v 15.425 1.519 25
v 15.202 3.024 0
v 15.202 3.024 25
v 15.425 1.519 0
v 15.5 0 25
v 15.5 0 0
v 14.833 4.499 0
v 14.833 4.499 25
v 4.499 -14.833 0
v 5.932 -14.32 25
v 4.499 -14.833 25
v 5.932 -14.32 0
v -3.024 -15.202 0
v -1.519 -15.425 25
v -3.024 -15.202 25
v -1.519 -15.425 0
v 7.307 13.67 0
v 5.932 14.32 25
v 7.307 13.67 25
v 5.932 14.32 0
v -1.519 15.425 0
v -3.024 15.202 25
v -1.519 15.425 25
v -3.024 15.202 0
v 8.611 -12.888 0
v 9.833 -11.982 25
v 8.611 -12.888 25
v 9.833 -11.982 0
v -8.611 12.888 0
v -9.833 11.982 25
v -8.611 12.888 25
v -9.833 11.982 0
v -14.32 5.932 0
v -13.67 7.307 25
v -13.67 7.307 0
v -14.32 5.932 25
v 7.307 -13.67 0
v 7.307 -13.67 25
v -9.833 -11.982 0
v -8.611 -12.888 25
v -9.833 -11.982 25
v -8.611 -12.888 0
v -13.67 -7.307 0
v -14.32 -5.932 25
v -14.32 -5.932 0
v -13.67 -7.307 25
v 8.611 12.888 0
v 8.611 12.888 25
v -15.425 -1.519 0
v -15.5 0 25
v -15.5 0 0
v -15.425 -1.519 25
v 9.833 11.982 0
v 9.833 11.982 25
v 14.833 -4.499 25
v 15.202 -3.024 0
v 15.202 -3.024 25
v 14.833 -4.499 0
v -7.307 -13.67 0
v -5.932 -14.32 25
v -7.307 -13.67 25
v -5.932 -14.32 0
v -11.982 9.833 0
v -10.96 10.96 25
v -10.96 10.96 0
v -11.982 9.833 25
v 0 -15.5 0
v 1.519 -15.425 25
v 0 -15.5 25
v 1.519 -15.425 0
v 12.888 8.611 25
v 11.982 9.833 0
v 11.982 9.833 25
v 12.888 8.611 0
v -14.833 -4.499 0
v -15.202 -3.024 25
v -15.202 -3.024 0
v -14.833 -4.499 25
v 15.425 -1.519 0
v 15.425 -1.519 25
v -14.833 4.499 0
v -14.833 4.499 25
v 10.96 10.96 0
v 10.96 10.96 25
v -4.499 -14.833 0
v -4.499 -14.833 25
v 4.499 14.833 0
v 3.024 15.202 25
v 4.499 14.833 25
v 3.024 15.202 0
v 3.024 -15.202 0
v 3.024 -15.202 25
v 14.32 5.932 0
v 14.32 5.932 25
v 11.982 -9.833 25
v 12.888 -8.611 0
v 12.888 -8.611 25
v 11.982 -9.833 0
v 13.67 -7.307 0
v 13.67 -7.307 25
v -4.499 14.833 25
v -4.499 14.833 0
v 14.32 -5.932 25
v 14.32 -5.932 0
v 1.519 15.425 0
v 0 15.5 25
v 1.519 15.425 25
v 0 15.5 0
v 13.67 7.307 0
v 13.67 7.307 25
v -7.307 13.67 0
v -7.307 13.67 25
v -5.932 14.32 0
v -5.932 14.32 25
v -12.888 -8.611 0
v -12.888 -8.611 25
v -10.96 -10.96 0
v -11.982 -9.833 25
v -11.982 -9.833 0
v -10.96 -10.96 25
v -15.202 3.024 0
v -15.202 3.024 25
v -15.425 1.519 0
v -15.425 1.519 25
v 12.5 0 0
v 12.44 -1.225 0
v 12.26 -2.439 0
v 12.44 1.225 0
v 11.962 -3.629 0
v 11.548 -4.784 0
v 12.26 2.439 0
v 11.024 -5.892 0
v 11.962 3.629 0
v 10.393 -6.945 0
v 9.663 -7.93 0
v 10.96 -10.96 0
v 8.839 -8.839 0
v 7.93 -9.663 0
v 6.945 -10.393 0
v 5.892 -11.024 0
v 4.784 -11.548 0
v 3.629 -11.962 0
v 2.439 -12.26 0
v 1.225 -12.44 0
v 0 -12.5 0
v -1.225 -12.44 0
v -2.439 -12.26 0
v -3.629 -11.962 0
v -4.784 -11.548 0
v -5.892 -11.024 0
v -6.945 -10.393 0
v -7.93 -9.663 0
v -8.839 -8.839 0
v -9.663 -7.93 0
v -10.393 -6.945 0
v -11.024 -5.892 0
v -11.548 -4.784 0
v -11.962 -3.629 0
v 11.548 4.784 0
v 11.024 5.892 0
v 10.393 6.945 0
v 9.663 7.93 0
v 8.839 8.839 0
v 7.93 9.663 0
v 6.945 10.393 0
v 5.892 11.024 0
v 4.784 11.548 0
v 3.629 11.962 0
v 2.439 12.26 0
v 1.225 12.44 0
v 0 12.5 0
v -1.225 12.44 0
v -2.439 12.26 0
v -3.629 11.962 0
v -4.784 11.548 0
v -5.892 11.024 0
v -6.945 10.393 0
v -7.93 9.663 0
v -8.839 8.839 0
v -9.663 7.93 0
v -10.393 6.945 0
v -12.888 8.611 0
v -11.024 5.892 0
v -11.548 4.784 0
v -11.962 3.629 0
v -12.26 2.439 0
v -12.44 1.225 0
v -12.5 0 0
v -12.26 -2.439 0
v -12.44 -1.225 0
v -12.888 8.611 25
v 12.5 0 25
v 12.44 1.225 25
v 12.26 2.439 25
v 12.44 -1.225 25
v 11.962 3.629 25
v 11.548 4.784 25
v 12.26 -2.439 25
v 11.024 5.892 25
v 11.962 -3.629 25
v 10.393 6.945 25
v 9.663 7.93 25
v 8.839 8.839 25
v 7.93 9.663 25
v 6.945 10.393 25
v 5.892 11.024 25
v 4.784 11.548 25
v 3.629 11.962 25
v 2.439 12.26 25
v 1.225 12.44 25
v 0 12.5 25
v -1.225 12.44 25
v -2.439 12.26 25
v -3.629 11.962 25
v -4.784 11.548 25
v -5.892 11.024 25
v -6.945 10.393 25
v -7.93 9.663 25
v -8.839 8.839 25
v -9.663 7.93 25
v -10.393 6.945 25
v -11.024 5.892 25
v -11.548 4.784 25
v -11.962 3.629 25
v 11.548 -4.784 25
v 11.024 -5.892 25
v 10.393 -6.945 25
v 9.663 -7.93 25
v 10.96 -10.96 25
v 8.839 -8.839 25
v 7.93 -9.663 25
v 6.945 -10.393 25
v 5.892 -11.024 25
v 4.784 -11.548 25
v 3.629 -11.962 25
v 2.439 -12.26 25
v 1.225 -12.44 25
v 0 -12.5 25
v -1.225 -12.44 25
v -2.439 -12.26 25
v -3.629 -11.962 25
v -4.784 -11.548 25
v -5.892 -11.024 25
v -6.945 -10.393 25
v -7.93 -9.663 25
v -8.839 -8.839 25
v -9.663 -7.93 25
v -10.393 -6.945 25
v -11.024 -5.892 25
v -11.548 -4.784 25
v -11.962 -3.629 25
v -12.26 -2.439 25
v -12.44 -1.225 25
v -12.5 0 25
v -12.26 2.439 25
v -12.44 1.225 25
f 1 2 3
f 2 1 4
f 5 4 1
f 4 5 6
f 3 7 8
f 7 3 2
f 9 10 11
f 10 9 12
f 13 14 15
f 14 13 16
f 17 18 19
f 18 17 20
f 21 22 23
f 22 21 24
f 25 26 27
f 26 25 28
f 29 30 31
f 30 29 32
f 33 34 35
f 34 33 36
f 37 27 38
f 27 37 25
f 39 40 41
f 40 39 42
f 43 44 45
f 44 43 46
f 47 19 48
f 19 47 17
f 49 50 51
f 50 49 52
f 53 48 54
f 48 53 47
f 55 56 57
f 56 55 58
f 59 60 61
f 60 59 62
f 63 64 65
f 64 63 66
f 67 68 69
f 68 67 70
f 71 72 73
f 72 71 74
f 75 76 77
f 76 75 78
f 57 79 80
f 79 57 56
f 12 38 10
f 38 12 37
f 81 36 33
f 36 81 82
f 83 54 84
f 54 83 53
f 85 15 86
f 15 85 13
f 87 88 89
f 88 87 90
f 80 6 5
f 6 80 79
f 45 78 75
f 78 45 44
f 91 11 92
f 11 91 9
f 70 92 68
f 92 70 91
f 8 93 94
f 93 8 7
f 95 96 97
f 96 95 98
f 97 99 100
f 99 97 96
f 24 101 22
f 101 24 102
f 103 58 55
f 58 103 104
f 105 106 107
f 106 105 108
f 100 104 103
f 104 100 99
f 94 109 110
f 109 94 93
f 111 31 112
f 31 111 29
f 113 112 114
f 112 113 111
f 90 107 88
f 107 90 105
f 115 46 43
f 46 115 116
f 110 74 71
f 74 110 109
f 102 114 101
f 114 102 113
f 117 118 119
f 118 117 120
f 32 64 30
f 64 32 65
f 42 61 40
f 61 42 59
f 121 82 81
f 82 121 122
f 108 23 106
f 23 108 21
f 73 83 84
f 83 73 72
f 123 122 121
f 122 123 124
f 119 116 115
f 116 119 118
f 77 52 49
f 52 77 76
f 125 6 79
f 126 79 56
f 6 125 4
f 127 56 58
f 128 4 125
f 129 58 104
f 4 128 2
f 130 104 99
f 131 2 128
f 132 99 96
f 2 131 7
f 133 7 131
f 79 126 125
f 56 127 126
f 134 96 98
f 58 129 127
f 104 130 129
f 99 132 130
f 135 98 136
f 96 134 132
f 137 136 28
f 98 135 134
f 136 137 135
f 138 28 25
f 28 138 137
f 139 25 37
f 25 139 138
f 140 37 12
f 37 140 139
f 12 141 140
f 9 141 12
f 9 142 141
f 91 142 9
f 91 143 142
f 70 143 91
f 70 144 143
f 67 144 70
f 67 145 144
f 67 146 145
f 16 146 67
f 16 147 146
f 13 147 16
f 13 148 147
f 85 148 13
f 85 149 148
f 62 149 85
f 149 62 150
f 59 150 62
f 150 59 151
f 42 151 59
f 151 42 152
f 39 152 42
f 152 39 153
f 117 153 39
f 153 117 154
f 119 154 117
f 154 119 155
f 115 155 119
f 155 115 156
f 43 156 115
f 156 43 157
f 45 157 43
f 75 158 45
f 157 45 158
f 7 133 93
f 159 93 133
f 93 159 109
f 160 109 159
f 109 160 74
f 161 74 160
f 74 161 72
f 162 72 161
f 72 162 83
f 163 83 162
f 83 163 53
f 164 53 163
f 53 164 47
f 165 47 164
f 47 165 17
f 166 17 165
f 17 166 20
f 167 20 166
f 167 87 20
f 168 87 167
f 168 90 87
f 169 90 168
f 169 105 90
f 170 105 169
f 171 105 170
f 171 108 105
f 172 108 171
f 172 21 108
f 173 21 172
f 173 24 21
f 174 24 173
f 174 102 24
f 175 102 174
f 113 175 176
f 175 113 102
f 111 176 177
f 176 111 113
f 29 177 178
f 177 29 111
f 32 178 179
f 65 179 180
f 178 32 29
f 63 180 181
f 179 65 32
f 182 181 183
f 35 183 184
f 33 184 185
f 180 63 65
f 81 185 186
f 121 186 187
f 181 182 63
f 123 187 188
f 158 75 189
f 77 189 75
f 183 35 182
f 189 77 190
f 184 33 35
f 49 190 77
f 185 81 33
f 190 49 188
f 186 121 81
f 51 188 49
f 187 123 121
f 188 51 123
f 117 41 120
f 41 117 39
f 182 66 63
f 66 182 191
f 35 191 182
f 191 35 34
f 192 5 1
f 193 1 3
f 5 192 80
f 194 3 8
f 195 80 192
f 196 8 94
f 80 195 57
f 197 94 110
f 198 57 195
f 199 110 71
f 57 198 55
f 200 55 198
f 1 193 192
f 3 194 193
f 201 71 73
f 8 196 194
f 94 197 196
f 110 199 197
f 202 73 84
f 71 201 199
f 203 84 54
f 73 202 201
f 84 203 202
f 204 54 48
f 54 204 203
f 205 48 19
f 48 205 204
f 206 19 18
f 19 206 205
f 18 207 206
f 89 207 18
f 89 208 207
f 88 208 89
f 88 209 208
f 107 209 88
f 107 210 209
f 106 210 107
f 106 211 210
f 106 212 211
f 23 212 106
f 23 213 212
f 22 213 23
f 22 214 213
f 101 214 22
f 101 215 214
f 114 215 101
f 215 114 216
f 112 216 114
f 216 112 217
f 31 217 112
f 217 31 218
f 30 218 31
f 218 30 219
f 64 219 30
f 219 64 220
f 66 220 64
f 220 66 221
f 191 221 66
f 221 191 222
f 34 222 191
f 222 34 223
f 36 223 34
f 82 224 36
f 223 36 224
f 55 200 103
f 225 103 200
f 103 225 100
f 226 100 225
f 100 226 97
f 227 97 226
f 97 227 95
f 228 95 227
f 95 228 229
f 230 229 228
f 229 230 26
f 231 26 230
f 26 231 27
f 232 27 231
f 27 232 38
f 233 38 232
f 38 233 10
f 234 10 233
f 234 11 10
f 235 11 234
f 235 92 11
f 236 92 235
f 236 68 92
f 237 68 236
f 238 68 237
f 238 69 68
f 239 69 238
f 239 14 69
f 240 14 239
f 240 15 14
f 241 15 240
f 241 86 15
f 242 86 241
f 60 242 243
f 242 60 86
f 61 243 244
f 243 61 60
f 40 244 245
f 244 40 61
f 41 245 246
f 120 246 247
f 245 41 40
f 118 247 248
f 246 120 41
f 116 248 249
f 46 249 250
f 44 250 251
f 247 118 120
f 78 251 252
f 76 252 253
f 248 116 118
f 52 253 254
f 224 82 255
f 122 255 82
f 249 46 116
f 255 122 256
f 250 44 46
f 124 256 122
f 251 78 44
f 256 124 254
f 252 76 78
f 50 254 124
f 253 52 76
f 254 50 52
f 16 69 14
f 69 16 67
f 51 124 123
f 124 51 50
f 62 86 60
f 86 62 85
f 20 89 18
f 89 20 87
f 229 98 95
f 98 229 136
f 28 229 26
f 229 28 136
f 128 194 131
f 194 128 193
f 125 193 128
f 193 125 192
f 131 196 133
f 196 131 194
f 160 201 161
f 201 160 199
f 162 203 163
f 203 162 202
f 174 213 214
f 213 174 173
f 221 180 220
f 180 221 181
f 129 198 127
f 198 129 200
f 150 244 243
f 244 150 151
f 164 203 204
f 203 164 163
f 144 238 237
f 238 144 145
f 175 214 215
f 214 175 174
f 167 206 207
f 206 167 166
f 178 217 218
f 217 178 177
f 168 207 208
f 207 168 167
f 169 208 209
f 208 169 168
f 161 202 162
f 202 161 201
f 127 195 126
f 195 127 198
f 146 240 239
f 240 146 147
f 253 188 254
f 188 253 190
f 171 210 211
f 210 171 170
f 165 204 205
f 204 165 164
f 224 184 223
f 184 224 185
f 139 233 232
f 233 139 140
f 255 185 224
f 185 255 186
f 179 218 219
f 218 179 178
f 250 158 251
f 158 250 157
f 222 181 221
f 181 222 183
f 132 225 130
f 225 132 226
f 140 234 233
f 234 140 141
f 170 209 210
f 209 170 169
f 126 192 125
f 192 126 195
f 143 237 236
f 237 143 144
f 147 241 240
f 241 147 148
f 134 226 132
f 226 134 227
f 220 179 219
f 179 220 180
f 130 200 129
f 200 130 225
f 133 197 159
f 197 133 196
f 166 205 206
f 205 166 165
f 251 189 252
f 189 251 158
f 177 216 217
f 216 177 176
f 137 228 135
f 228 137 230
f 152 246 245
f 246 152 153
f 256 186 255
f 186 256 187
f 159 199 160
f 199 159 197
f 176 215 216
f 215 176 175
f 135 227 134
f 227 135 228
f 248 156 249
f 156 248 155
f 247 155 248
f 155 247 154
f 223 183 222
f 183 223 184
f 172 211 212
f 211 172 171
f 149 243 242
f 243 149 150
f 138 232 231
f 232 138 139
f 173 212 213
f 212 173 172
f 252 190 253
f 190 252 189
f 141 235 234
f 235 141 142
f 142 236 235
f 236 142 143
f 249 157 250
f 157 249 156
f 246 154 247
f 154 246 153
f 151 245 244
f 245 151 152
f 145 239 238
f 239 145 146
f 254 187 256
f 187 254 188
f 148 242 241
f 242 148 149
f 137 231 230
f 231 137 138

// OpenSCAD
wall = 3;
diam = 25;
height = 25;

difference() {
    cylinder(h = height, d = diam + wall * 2, $fn = 64);
    cylinder(h = height, d = diam, $fn = 64);
}
